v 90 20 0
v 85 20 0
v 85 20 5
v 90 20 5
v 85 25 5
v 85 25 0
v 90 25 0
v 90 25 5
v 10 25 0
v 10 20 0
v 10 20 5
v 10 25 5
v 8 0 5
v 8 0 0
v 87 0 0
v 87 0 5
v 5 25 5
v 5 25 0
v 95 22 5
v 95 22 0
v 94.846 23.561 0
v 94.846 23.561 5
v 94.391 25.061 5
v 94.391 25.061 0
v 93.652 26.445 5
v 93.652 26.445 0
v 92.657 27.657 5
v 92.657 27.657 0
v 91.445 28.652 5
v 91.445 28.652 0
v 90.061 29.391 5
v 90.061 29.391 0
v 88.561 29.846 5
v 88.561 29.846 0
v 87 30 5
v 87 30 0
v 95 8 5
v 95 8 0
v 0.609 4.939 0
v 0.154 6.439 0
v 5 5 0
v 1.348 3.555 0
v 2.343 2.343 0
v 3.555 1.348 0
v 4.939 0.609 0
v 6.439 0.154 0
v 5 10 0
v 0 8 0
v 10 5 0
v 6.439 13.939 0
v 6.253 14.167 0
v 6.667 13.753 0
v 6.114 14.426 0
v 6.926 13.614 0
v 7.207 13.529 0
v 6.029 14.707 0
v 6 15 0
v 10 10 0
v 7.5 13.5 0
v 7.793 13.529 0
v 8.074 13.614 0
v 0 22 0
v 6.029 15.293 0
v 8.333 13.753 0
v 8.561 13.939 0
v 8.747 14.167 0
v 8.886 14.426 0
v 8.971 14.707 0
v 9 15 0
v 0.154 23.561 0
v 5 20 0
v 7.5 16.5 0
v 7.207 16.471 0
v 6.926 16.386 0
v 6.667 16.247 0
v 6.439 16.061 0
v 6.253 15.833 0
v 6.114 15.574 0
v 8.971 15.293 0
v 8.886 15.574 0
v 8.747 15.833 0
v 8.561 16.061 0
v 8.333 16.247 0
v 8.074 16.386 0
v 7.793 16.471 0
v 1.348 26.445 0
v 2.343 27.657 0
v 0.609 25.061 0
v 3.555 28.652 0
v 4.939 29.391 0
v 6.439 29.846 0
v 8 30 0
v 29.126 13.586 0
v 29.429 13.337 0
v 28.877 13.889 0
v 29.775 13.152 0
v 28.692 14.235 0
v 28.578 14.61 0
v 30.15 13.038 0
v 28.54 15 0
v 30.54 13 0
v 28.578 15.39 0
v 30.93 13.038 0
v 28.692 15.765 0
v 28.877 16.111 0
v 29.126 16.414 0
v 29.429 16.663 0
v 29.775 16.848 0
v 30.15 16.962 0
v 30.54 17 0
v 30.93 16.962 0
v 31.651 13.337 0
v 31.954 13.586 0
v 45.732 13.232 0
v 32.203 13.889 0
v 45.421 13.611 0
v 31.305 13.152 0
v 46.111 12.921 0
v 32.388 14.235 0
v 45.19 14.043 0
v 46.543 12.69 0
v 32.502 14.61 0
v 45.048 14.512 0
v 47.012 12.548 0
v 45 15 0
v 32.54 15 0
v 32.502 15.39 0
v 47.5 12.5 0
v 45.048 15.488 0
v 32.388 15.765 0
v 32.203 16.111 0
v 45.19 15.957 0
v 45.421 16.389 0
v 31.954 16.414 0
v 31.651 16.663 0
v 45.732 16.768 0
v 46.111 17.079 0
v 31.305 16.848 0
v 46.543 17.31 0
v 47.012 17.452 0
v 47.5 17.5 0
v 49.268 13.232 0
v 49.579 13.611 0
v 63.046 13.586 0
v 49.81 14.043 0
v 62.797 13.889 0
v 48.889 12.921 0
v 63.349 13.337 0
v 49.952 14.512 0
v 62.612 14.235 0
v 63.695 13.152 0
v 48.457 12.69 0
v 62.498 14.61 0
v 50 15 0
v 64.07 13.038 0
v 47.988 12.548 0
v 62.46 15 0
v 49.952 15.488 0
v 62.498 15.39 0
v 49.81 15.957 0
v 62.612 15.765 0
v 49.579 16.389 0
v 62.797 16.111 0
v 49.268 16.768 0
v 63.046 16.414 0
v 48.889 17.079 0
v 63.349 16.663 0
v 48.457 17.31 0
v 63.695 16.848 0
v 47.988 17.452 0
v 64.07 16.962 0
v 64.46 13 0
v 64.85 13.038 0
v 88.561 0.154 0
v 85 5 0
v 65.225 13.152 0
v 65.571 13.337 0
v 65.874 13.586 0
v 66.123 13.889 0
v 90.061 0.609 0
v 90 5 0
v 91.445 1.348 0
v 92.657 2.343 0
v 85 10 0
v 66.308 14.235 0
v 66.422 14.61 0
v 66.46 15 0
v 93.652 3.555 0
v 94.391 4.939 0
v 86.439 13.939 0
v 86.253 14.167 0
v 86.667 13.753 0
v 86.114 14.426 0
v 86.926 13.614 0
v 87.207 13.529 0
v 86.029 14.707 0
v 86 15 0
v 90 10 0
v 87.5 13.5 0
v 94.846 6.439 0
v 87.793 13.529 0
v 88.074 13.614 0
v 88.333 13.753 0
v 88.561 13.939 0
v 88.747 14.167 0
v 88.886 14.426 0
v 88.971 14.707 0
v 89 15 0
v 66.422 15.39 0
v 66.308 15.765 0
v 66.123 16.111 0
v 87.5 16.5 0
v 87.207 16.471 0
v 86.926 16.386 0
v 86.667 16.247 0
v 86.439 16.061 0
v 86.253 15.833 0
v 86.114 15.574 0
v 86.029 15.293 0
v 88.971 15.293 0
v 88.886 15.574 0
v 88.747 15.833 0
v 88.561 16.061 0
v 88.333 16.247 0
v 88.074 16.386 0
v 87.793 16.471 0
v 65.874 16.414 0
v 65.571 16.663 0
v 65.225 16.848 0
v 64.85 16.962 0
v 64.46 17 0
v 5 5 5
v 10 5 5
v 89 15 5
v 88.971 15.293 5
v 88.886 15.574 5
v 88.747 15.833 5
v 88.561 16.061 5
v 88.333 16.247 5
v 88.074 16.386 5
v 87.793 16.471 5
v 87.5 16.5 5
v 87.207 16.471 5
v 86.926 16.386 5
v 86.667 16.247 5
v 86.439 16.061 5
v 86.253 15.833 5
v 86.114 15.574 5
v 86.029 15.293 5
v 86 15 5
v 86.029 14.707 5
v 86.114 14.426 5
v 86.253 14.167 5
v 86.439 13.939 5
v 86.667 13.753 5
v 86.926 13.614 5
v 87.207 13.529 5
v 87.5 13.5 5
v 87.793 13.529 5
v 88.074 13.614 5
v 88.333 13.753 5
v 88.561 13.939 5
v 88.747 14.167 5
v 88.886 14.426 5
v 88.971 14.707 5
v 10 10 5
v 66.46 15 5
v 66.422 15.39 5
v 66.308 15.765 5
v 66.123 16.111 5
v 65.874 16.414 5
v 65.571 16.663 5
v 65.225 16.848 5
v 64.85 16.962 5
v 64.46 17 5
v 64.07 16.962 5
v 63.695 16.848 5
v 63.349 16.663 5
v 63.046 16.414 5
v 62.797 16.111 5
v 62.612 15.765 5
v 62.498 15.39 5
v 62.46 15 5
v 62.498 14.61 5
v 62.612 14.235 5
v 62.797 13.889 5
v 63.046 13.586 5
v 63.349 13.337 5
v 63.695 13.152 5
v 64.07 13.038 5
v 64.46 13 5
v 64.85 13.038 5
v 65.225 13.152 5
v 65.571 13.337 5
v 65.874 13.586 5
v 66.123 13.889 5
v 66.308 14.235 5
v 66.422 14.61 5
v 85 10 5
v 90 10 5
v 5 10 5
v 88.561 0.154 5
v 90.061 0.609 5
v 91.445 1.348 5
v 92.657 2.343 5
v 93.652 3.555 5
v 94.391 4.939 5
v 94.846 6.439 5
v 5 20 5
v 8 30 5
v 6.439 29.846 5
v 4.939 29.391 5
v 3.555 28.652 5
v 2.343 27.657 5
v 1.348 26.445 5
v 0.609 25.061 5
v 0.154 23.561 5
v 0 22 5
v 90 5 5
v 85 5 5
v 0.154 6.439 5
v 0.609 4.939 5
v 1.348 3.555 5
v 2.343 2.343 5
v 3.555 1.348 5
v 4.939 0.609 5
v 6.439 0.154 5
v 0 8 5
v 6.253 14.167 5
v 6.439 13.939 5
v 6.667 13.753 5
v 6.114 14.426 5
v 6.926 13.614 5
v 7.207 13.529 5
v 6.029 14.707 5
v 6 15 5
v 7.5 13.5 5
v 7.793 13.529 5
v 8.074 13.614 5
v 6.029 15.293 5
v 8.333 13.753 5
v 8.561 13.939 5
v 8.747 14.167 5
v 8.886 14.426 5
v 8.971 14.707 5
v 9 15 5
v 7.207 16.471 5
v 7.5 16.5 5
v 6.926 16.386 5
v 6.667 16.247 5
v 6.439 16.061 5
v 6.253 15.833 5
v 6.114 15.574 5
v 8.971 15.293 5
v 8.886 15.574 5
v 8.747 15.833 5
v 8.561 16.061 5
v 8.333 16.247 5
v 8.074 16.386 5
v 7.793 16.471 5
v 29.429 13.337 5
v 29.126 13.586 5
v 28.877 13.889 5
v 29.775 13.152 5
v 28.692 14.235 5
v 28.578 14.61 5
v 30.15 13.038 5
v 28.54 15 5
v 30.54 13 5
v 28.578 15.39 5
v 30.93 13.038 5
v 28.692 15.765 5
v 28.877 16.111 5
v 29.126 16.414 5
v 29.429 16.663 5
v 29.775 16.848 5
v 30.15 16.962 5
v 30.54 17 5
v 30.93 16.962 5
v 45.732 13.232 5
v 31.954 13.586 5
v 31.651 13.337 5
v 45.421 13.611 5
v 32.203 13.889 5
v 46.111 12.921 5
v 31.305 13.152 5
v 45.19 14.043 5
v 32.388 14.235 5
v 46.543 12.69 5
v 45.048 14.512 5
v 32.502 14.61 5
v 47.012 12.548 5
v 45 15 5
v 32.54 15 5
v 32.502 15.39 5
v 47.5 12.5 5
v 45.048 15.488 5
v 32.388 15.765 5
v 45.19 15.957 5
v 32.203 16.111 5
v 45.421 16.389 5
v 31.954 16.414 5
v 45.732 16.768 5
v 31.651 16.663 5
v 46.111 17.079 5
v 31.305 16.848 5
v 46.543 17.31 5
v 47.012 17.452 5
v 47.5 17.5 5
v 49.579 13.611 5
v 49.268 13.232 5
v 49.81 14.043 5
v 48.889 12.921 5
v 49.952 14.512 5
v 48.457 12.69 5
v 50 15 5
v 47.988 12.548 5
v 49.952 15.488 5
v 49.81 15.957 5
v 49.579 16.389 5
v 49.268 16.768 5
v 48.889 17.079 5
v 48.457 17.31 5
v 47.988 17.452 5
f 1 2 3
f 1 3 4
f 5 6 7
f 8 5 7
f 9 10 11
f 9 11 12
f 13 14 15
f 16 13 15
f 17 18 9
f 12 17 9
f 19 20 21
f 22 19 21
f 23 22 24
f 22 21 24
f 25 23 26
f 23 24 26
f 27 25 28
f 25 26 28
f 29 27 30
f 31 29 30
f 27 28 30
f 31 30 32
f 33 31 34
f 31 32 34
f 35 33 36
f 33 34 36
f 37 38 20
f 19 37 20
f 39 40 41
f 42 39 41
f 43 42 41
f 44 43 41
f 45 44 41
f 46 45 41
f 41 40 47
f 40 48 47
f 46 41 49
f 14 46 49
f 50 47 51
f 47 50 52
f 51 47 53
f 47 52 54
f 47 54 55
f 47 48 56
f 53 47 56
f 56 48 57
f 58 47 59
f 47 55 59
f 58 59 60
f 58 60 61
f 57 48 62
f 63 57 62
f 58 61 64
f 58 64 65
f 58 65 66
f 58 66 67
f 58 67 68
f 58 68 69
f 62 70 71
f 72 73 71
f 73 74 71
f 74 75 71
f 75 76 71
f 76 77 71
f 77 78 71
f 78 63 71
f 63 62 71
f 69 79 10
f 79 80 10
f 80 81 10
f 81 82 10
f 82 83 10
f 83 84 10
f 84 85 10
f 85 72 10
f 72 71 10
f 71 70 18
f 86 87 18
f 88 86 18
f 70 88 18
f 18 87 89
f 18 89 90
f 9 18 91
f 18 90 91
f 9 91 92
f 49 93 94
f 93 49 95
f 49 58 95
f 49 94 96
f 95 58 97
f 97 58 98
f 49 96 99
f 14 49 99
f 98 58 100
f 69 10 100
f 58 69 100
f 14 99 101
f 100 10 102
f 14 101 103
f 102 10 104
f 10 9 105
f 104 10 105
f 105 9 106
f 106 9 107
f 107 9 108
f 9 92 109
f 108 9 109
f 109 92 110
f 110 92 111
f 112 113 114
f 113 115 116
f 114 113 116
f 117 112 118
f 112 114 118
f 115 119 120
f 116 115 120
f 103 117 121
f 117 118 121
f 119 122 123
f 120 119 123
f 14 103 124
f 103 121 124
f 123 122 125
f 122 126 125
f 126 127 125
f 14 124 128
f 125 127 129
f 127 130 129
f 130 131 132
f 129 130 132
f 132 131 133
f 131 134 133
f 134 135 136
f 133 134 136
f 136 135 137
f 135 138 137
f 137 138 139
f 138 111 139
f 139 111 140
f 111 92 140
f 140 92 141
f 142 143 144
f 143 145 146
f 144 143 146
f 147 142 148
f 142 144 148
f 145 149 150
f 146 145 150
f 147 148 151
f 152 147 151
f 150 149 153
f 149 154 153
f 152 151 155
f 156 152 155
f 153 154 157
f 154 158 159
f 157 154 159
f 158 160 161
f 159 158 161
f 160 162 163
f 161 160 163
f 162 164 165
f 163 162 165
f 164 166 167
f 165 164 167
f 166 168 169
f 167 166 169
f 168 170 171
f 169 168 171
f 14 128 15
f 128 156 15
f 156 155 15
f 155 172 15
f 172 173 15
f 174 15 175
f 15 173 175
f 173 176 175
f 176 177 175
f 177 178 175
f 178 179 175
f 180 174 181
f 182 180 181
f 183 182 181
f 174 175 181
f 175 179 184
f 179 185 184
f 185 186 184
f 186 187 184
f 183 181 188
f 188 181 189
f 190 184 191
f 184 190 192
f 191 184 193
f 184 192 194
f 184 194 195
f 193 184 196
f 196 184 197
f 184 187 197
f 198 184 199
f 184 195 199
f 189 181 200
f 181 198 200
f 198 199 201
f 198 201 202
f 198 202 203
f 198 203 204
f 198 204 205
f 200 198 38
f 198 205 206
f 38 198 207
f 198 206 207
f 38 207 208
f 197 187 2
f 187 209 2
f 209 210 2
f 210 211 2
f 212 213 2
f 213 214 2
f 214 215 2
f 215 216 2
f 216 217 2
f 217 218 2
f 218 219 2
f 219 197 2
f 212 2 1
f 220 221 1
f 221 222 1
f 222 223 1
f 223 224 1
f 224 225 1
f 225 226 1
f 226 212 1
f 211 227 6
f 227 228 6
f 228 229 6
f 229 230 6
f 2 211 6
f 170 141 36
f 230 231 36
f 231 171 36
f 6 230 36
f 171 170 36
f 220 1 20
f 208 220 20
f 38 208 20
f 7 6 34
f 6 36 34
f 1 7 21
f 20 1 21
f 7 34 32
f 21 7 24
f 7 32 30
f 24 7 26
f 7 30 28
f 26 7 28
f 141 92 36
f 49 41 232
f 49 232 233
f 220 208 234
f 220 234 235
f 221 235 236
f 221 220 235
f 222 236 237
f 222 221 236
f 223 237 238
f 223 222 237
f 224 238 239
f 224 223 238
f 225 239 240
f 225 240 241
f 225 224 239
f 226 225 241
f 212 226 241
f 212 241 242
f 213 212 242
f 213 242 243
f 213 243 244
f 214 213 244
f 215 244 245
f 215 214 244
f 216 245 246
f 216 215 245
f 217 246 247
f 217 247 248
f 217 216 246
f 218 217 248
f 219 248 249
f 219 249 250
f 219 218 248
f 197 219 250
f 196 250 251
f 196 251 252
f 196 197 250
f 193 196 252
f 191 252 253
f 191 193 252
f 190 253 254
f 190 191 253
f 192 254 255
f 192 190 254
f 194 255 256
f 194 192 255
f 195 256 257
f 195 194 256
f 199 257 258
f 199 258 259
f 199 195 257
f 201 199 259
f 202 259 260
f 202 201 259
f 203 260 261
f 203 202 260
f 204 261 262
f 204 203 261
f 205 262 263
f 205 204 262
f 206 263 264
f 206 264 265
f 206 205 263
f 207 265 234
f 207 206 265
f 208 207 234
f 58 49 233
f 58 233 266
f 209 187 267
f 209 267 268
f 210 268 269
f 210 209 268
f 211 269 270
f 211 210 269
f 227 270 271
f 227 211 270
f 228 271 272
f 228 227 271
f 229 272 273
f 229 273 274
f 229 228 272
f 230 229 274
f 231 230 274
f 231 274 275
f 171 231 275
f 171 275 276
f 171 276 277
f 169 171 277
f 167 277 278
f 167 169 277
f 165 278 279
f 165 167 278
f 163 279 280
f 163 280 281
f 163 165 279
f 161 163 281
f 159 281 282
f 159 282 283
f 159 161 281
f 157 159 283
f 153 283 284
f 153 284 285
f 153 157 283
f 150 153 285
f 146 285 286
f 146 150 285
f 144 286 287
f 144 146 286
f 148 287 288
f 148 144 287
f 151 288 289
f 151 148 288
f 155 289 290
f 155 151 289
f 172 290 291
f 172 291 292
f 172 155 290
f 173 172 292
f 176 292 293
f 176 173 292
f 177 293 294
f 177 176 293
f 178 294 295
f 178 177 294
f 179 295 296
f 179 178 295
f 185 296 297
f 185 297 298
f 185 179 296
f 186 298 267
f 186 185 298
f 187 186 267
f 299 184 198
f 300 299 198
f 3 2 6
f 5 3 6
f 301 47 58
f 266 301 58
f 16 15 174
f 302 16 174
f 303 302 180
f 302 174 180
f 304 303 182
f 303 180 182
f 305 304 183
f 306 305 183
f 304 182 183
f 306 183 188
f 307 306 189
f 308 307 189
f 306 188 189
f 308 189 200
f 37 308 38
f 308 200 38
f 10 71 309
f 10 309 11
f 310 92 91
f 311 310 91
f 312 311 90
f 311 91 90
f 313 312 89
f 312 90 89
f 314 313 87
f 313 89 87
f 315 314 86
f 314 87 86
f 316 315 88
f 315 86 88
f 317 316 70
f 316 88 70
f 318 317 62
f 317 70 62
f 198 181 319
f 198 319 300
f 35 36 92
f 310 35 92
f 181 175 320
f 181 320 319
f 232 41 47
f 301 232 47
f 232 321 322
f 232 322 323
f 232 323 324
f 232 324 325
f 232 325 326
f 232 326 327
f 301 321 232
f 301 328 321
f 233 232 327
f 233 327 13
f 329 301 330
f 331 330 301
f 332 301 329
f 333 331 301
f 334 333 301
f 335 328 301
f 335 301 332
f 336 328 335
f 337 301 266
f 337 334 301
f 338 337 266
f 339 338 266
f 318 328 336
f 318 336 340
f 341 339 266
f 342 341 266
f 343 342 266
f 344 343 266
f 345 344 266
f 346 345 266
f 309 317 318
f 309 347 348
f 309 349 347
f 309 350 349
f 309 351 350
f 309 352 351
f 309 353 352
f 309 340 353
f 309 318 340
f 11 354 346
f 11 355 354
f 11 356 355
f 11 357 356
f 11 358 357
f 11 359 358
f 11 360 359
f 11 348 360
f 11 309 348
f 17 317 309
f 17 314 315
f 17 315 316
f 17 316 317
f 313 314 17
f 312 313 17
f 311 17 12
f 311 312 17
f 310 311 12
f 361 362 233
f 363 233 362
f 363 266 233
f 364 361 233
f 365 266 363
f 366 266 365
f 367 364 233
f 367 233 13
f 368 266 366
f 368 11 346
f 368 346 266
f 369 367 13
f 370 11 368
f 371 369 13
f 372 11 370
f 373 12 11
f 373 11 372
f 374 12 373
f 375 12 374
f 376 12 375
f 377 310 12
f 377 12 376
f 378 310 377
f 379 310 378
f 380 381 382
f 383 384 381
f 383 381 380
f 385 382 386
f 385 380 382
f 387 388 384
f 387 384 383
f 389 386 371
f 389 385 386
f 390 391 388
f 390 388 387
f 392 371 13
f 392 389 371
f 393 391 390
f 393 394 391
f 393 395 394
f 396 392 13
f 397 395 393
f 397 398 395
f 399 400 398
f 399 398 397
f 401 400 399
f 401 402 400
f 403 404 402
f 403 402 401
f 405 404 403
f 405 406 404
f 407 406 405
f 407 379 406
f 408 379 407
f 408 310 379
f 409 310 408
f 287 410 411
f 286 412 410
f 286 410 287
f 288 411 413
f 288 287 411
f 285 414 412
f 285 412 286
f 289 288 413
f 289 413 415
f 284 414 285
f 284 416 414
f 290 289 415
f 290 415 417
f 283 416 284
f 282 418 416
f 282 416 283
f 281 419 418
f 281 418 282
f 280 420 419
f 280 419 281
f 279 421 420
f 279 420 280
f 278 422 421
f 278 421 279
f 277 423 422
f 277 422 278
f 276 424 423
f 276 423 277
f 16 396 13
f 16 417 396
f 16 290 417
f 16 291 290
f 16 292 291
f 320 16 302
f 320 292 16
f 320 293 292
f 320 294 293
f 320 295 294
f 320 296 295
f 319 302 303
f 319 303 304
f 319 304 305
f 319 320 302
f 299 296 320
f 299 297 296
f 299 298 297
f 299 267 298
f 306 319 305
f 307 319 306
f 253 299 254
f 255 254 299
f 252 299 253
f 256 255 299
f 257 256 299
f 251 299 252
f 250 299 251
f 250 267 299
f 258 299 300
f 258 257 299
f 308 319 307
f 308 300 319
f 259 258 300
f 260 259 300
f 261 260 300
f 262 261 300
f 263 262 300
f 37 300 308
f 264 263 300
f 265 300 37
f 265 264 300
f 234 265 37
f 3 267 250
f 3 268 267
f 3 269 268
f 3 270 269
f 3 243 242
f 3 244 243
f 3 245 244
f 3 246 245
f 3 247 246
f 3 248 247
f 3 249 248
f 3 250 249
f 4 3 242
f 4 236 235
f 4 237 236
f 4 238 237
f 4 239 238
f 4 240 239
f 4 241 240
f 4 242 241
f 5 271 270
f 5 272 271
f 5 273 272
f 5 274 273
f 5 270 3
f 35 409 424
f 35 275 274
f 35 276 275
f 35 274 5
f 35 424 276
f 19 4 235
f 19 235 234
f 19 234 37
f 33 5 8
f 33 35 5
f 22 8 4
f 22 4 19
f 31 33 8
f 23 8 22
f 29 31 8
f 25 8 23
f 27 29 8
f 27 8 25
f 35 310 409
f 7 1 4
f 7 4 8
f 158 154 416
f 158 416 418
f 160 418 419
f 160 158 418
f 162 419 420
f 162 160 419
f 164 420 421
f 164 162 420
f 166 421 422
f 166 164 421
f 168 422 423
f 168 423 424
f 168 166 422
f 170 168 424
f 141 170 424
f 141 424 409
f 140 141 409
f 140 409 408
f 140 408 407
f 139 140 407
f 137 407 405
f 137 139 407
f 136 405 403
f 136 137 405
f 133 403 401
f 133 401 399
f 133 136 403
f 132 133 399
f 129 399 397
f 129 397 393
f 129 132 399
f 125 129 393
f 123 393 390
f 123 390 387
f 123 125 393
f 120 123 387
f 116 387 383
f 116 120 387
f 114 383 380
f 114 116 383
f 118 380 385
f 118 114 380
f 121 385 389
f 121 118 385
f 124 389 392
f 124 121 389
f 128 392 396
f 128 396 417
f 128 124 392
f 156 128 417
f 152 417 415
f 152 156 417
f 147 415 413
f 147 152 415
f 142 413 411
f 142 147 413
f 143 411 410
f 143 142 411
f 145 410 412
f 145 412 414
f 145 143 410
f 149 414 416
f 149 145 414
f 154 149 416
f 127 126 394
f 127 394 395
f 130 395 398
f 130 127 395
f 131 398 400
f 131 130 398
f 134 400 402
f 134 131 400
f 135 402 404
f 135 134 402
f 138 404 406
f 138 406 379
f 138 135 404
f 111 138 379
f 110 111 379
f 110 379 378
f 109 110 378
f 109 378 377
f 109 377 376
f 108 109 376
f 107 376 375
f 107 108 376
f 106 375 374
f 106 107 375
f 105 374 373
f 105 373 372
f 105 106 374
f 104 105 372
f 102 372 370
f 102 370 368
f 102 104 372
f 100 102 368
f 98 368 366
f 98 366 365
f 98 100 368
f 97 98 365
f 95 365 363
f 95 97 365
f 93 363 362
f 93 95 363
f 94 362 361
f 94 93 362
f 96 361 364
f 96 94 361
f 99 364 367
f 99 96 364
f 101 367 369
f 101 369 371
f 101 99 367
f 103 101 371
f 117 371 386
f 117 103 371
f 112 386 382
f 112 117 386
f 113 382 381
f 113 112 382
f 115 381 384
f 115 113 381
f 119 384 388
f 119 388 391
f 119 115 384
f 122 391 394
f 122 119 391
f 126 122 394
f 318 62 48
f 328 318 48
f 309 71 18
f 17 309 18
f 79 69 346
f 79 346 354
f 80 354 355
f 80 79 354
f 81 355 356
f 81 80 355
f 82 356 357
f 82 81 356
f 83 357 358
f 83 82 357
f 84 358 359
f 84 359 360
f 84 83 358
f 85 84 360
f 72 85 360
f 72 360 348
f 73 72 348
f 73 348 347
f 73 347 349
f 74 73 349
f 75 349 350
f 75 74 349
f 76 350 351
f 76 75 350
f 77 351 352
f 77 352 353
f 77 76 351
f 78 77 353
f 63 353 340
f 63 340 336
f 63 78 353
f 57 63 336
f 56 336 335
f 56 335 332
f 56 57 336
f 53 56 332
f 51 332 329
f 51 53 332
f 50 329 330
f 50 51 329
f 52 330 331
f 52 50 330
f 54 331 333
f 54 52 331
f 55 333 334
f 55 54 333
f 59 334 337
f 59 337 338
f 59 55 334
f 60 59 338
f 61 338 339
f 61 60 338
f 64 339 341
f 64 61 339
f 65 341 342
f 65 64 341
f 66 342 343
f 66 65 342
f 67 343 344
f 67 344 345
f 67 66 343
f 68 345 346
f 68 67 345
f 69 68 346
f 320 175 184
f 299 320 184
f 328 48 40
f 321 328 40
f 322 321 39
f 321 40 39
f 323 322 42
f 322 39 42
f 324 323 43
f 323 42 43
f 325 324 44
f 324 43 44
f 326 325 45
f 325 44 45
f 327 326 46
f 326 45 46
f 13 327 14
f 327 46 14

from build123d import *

# Parameters (mm, degrees)
ESQUISSE1_R        = 1.5
ESQUISSE1_R_2      = 2
ESQUISSE1_R_3      = 2.5
ESQUISSE1_W        = 5
ESQUISSE1_H        = 5
BOSS_EXTRU_1_DEPTH = 5


with BuildPart() as part:
    # Esquisse1 → Boss.-Extru.1 (new body)
    with BuildSketch(Plane.XY):
        with BuildLine():
            Line((8, 0), (87, 0))
            ThreePointArc((87, 0), (92.656854249, 2.343145751), (95, 8))
            Line((95, 8), (95, 22))
            ThreePointArc((95, 22), (92.656854249, 27.656854249), (87, 30))
            Line((87, 30), (8, 30))
            ThreePointArc((8, 30), (2.343145751, 27.656854249), (0, 22))
            Line((0, 22), (0, 8))
            ThreePointArc((0, 8), (2.343145751, 2.343145751), (8, 0))
        make_face()
        with Locations((7.5, 15)):
            Circle(ESQUISSE1_R, mode=Mode.SUBTRACT)
        with Locations((87.5, 15)):
            Circle(ESQUISSE1_R, mode=Mode.SUBTRACT)
        with Locations((30.54, 15)):
            Circle(ESQUISSE1_R_2, mode=Mode.SUBTRACT)
        with Locations((64.46, 15)):
            Circle(ESQUISSE1_R_2, mode=Mode.SUBTRACT)
        with Locations((47.5, 15)):
            Circle(ESQUISSE1_R_3, mode=Mode.SUBTRACT)
        with Locations((7.5, 22.5)):
            Rectangle(ESQUISSE1_W, ESQUISSE1_H, mode=Mode.SUBTRACT)
        with Locations((87.5, 22.5)):
            Rectangle(ESQUISSE1_W, ESQUISSE1_H, mode=Mode.SUBTRACT)
        with Locations((87.5, 7.5)):
            Rectangle(ESQUISSE1_W, ESQUISSE1_H, mode=Mode.SUBTRACT)
        with Locations((7.5, 7.5)):
            Rectangle(ESQUISSE1_W, ESQUISSE1_H, mode=Mode.SUBTRACT)
    extrude(amount=BOSS_EXTRU_1_DEPTH)


solid = part.part
